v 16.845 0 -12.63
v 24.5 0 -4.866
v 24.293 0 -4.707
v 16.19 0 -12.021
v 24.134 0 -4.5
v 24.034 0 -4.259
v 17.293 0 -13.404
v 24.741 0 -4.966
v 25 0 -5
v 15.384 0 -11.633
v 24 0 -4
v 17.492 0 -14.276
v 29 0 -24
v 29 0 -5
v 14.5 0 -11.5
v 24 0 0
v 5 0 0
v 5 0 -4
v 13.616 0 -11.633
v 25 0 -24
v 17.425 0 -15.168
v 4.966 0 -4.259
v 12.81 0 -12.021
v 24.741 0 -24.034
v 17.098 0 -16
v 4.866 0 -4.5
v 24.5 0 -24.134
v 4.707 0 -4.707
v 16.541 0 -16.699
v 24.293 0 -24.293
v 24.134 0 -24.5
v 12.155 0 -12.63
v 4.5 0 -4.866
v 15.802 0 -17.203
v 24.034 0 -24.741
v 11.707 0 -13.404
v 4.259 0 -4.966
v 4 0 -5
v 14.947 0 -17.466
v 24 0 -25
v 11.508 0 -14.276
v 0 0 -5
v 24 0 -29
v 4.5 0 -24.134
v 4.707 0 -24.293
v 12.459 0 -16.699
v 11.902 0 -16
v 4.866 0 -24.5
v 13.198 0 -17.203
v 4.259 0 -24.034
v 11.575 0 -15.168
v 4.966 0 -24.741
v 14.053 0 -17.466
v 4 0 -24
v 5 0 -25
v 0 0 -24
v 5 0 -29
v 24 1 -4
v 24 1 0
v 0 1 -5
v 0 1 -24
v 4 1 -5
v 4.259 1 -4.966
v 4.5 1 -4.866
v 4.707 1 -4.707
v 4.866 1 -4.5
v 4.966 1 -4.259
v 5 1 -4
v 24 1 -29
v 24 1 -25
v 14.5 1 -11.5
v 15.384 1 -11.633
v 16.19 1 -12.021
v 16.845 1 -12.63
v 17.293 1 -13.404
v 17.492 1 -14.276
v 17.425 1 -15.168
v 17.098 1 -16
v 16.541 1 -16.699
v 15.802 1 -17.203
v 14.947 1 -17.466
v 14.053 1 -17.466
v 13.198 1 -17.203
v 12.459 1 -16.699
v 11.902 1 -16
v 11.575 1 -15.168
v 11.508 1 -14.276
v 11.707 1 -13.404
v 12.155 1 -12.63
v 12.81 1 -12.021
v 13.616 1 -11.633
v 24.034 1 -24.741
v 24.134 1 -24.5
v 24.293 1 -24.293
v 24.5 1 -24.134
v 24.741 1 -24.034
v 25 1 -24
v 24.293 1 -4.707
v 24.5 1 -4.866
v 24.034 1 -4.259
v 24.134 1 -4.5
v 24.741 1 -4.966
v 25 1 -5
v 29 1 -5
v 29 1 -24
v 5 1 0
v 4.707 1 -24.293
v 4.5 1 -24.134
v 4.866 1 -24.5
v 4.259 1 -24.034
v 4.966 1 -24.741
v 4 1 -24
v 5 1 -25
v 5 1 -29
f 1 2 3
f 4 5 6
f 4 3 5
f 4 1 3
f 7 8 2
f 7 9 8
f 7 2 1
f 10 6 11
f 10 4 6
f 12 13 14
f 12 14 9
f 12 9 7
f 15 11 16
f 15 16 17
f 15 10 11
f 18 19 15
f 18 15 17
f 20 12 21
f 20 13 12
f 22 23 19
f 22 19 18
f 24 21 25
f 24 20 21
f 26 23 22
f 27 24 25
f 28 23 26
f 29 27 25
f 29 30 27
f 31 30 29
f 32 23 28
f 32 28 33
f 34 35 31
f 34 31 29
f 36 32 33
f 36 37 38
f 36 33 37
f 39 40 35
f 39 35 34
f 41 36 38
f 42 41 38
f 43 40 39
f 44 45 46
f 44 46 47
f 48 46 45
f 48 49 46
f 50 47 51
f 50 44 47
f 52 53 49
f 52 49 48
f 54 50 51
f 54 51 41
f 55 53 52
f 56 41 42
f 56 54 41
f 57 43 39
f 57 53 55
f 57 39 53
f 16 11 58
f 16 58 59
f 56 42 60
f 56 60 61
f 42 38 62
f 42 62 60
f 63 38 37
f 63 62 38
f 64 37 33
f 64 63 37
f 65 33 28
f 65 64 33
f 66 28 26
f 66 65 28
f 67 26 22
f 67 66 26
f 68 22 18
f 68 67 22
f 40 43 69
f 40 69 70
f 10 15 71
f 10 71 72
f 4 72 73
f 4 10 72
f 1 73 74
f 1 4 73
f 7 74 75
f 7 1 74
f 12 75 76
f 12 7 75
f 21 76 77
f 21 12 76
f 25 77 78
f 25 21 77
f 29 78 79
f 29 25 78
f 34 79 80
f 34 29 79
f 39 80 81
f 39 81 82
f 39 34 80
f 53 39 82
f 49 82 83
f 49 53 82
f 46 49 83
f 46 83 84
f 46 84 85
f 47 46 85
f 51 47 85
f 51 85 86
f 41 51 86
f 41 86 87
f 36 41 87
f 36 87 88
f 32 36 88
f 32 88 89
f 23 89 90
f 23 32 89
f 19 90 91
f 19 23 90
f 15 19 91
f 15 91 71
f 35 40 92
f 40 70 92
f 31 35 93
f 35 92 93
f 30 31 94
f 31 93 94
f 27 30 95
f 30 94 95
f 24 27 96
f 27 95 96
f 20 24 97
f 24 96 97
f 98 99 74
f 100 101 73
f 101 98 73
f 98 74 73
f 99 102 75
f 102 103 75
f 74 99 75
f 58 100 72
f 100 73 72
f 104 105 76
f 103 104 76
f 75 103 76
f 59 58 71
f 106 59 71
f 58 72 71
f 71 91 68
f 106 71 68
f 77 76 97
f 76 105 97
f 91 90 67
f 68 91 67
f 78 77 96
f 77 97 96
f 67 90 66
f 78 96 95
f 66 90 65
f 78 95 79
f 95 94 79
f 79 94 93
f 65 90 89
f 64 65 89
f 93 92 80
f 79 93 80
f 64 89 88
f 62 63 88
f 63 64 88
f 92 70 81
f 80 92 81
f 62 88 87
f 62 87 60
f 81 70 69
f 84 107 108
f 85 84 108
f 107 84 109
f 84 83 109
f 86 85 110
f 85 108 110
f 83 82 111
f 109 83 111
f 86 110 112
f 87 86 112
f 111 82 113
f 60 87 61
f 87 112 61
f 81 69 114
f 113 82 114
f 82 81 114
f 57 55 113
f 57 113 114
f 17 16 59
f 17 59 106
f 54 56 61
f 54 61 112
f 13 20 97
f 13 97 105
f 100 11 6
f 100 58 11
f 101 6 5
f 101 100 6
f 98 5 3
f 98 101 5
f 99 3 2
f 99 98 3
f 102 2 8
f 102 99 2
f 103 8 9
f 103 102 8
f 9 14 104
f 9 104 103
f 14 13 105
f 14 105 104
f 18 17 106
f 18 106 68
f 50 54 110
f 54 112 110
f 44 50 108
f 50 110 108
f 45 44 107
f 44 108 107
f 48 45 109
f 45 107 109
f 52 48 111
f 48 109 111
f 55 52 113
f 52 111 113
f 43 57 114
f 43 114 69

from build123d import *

# Parameters (mm, degrees)
SKETCH2_R           = 3
BOSS_EXTRUDE1_DEPTH = 1
FILLET1_R           = 1


with BuildPart() as part:
    # Sketch2 → Boss-Extrude1 (new body)
    with BuildSketch(Plane(origin=(0, 0, 0), x_dir=(1, 0, 0), z_dir=(0, 1, 0))):
        Polygon((0, 24), (5, 24), (5, 29), (24, 29), (24, 24), (29, 24), (29, 5), (24, 5), (24, 0), (5, 0), (5, 5), (0, 5), align=None)
        with Locations(Location((14.5, 14.5, 0), (0, 0, 270))):
            Circle(SKETCH2_R, mode=Mode.SUBTRACT)
    extrude(amount=BOSS_EXTRUDE1_DEPTH)

    # Fillet1
    fillet1_edges = [part.edges().sort_by_distance(p)[0] for p in [
        (5, 0.5, -24),
        (24, 0.5, -24),
        (24, 0.5, -5),
        (5, 0.5, -5),
    ]]
    fillet(fillet1_edges, radius=FILLET1_R)


solid = part.part
